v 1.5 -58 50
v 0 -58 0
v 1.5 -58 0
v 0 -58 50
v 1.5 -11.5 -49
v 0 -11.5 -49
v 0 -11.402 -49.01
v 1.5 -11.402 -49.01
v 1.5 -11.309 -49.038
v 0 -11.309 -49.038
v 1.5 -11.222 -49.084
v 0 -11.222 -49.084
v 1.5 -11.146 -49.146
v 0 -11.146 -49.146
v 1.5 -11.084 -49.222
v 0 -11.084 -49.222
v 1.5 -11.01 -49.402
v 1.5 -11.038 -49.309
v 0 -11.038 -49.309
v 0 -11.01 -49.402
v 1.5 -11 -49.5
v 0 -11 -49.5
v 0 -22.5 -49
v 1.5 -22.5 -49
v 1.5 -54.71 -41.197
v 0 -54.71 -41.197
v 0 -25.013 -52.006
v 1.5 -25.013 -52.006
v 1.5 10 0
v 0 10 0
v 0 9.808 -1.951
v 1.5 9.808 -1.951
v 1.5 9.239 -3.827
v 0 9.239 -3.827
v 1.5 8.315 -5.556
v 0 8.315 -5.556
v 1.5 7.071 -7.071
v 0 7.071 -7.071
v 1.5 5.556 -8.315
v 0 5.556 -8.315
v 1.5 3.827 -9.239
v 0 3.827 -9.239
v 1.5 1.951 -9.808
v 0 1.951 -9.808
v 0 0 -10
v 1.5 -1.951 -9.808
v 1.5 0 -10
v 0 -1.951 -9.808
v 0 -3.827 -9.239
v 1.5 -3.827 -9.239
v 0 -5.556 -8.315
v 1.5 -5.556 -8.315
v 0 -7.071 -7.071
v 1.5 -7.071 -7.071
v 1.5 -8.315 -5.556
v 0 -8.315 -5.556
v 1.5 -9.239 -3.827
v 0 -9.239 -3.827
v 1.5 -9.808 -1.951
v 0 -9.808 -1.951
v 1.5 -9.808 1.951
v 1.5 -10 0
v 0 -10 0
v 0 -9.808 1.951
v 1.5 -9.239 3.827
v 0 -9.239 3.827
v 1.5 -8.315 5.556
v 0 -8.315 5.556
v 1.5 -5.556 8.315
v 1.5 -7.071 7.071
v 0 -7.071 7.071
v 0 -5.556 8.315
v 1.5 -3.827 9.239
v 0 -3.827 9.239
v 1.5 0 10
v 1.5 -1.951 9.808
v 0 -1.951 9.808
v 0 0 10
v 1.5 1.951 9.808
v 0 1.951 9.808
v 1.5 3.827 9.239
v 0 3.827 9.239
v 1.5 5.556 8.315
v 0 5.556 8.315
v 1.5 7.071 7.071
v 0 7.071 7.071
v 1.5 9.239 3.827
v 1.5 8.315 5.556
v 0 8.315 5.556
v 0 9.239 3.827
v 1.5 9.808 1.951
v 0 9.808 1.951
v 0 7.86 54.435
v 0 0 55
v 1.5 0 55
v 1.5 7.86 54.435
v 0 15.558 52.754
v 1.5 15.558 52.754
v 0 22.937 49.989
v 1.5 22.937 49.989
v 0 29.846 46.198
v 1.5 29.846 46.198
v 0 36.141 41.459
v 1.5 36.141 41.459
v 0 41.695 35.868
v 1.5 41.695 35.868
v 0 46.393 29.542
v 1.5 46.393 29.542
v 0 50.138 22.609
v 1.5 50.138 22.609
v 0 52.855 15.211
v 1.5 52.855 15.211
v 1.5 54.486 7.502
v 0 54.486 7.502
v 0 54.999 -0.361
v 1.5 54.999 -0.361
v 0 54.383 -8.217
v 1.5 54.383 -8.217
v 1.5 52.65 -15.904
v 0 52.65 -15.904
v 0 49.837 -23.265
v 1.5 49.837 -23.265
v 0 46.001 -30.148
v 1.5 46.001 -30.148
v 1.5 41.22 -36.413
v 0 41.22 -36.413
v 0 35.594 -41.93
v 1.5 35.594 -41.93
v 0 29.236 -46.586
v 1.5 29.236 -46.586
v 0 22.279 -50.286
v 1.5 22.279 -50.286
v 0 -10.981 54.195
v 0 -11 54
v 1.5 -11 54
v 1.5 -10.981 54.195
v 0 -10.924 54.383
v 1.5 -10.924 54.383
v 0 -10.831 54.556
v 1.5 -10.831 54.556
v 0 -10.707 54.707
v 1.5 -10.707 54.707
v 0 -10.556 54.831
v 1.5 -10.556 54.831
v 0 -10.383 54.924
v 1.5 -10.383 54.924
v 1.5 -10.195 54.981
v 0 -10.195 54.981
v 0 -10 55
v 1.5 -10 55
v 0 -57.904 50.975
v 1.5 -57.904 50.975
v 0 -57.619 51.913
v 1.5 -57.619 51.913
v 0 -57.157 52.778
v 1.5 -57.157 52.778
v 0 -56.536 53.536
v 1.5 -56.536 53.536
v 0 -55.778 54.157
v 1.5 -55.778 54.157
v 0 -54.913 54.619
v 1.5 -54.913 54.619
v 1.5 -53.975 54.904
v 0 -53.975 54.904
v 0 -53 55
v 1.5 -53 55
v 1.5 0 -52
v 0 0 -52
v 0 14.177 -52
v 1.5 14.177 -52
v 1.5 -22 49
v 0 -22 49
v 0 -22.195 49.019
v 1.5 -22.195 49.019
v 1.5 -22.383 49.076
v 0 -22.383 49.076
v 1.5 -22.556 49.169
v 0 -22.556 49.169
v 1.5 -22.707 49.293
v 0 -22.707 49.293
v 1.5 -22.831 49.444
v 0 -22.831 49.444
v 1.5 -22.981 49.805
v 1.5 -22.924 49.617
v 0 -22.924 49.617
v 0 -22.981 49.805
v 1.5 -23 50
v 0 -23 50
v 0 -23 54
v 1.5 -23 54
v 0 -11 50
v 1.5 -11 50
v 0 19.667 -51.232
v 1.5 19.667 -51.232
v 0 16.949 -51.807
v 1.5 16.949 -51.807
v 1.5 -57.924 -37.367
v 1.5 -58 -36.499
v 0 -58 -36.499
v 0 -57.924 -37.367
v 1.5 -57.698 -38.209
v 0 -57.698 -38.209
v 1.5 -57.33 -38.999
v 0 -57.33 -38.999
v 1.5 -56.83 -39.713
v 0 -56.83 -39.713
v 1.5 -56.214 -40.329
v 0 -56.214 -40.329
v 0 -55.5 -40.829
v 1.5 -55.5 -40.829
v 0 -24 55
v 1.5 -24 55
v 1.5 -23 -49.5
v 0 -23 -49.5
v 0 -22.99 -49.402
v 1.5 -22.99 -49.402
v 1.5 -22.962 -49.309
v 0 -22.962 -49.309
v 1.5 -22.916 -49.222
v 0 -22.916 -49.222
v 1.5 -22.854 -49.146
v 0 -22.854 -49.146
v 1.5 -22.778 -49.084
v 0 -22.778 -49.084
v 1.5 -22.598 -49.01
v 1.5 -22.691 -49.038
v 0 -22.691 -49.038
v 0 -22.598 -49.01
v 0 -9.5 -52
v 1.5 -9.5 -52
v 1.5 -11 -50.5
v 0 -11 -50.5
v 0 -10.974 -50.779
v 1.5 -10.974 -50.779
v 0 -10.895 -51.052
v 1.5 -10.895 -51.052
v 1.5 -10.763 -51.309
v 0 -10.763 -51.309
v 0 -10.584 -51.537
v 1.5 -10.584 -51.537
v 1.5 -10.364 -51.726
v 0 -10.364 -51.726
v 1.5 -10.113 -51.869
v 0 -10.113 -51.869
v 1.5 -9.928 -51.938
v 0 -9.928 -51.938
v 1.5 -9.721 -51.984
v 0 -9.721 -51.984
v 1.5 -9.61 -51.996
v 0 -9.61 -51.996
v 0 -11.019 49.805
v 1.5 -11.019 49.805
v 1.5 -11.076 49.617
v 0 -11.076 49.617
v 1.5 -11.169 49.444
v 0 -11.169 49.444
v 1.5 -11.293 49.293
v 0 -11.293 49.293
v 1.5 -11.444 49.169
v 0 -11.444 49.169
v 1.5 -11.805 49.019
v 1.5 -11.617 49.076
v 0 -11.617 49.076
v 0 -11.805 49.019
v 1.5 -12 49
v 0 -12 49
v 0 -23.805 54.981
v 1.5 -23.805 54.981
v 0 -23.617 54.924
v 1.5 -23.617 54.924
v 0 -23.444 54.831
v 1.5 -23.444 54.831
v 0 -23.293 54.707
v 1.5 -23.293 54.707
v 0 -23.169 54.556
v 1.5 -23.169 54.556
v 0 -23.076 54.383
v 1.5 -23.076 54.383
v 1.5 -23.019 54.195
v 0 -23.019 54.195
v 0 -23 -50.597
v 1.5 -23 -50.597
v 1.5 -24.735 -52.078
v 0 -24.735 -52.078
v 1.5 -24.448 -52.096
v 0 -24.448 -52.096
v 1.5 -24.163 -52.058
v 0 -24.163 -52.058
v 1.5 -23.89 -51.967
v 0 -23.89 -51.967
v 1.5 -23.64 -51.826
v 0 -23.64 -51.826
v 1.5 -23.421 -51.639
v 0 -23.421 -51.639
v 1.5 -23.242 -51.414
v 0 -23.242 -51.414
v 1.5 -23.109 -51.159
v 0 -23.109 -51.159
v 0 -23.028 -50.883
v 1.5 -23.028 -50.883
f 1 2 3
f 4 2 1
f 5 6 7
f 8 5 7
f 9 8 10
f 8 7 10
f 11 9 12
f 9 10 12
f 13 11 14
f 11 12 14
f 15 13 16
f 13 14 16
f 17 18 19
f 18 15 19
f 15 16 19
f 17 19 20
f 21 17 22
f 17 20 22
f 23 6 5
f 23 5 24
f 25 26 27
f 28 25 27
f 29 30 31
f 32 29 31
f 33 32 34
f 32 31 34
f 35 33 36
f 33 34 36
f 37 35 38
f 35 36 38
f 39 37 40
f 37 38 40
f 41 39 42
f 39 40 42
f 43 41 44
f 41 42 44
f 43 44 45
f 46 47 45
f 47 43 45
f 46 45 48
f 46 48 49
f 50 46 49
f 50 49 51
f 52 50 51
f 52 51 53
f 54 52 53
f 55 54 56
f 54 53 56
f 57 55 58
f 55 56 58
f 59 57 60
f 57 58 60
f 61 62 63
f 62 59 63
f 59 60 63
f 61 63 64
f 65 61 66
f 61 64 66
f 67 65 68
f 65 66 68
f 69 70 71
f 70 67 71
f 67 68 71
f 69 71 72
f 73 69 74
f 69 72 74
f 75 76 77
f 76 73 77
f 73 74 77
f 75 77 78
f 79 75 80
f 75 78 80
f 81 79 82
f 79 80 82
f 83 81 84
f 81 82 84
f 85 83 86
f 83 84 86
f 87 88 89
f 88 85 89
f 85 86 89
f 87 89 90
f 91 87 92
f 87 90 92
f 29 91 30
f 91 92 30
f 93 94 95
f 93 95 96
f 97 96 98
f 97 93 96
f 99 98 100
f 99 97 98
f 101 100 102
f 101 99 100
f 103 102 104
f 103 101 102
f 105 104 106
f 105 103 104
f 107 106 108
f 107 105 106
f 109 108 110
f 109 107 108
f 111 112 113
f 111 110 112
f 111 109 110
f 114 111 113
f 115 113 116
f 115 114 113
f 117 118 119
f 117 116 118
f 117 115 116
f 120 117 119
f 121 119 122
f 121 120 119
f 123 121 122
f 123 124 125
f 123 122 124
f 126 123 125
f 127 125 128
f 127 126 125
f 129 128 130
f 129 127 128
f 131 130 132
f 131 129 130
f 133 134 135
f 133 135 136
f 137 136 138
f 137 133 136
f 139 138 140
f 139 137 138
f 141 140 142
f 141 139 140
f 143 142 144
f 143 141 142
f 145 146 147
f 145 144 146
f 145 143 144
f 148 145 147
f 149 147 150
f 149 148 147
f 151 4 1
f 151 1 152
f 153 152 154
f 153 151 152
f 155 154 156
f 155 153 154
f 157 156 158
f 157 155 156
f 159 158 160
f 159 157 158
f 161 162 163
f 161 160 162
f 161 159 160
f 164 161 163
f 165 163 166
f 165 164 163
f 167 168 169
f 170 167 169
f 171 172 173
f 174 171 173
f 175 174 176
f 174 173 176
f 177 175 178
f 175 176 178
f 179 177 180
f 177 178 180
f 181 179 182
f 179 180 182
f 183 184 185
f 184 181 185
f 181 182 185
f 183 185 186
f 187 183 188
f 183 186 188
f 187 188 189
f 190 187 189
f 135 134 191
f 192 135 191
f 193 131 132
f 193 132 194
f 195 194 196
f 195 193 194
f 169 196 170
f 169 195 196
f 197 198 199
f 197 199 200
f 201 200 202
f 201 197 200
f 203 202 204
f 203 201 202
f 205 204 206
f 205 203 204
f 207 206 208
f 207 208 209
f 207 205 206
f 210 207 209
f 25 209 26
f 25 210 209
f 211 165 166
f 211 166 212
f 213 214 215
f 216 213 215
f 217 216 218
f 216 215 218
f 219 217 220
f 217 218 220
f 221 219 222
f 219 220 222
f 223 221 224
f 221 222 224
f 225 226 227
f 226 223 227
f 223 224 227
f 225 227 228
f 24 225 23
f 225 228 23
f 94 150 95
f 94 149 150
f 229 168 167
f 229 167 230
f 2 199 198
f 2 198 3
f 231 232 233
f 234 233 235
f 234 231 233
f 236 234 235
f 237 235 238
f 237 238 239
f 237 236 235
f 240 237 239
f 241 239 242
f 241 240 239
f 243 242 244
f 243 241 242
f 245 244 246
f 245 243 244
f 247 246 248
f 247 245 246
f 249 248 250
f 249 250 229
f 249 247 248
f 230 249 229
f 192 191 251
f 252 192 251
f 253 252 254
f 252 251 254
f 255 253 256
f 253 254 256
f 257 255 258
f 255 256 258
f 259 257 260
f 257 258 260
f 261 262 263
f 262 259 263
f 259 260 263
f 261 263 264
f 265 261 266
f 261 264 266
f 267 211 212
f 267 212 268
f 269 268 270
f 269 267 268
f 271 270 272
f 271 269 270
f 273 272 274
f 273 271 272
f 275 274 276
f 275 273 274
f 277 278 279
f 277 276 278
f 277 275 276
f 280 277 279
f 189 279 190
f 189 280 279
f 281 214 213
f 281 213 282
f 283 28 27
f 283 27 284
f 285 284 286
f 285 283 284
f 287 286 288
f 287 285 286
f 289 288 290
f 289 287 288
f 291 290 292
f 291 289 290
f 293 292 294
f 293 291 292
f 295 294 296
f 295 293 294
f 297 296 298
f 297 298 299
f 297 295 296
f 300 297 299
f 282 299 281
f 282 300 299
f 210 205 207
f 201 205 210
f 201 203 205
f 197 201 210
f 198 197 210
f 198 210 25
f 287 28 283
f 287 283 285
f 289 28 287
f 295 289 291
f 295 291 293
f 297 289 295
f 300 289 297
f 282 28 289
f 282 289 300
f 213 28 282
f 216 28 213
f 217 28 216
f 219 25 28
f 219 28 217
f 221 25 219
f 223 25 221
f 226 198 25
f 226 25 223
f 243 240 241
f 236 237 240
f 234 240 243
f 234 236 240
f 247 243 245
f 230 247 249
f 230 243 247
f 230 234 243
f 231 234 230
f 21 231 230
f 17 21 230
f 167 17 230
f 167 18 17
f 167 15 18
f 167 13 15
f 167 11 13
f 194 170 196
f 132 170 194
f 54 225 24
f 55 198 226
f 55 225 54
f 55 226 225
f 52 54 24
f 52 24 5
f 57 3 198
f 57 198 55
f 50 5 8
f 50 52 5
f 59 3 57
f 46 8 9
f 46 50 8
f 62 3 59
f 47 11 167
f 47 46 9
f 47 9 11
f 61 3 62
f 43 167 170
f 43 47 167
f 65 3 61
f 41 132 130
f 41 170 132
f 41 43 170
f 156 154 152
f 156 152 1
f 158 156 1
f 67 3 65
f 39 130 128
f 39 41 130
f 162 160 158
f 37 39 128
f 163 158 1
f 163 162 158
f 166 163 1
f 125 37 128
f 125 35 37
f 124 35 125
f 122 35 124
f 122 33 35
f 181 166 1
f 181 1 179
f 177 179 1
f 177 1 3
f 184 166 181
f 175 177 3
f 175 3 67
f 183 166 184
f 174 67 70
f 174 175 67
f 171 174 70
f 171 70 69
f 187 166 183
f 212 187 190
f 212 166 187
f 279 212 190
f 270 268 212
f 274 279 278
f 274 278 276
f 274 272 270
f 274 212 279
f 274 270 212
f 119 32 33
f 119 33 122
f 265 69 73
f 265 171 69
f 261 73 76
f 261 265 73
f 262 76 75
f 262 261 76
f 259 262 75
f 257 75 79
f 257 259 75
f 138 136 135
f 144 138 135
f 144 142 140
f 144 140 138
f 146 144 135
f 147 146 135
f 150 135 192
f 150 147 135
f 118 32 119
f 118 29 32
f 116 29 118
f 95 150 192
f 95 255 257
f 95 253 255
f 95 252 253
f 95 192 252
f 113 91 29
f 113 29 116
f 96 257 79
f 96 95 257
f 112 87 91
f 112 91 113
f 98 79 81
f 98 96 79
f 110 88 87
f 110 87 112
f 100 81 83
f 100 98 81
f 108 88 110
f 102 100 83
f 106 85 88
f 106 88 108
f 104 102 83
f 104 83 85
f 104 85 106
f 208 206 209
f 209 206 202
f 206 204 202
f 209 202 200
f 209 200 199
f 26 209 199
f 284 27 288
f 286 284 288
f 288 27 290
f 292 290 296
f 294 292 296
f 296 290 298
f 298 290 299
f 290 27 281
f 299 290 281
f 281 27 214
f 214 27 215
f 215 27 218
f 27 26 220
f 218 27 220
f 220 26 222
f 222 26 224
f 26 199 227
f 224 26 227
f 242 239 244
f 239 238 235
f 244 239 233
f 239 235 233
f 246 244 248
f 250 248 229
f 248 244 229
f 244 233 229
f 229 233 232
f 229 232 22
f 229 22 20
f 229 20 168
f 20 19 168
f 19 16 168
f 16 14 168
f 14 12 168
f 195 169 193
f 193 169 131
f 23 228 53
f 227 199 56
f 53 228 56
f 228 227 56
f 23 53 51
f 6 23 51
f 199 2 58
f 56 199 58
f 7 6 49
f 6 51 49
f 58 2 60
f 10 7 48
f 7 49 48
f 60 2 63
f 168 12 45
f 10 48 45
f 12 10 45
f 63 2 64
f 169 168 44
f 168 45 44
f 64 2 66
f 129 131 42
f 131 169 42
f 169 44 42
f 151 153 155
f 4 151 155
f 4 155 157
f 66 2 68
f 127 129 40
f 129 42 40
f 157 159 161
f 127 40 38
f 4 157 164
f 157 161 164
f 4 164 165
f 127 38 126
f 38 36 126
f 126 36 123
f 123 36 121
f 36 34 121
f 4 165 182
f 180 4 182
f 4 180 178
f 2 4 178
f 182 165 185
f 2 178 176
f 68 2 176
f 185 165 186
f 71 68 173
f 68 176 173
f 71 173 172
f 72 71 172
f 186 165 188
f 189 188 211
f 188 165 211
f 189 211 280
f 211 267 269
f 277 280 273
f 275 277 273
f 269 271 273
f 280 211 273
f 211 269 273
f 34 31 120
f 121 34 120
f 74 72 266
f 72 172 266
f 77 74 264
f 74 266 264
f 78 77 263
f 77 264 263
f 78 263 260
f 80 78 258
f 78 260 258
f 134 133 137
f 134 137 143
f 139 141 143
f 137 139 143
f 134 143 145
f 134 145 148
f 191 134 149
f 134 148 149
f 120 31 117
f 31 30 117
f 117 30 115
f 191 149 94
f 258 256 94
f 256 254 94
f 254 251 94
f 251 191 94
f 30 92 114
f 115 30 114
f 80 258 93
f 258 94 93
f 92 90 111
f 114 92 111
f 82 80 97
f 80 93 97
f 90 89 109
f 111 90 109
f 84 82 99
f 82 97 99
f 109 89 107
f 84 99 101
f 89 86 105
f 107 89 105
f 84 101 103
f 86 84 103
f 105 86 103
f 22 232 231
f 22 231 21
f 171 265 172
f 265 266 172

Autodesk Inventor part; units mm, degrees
ref_plane "YZ Plane" through (0, 0, 0) normal (1, 0, 0) x (0, 1, 0)
ref_plane "XZ Plane" through (0, 0, 0) normal (0, 1, 0) x (-1, 0, 0)
ref_plane "XY Plane" through (0, 0, 0) normal (0, 0, 1) x (1, 0, 0)
sketch "Sketch1" plane through (0, 0, 0) normal (1, 0, 0) x (0, 1, 0)
  line L0 (-58, -40) -> (-58, 50)
  line L1 (0, 0) -> (-57.3223, 54.5531) construction
  circle A0 centre (0, 0) radius 47 construction
  circle A1 centre (0, 0) radius 10
  line L2 (-11, -52) -> (14.1774, -52)
  line L3 (-58, 0) -> (-58, -40)
  line L4 (0, 0) -> (0, -52) construction
  line L5 (-58, -40) -> (-23, -52.739)
  circle A2 centre (0, 0) radius 50 construction
  arc A3 (22.2788, -50.2857) -> (0, 55) centre (0, 0) ccw
  line L6 (-43.4633, 41.3636) -> (-48.6337, 35.9307)
  arc A4 (-53, 55) -> (-58, 50) centre (-53, 50) ccw
  line L7 (-11, 54) -> (-11, 50)
  line L8 (-12, 49) -> (-22, 49)
  line L9 (-23, 50) -> (-23, 54)
  line L10 (-53, 55) -> (-24, 55)
  line L11 (-10, 55) -> (0, 55)
  arc A5 (-23, 54) -> (-24, 55) centre (-24, 54) ccw
  arc A6 (-10, 55) -> (-11, 54) centre (-10, 54) ccw
  arc A7 (-12, 49) -> (-11, 50) centre (-12, 50) ccw
  arc A8 (-23, 50) -> (-22, 49) centre (-22, 50) ccw
  arc A9 (14.1774, -52) -> (22.2788, -50.2857) centre (14.1774, -32) ccw
  line L12 (-23, -49.5) -> (-23, -52.739)
  line L13 (-11, -52) -> (-11, -49.5)
  line L14 (-11.5, -49) -> (-22.5, -49)
  arc A10 (-11, -49.5) -> (-11.5, -49) centre (-11.5, -49.5) ccw
  arc A11 (-22.5, -49) -> (-23, -49.5) centre (-22.5, -49.5) ccw
  line L15 (0, -52) -> (-10, -52)
  point P0 (-28.9755, 27.5757)
  point P1 (-57.7919, 55)
  point P2 (-58, 55)
  point P3 (-25.2108, 39.6663)
  point P4 (17.9165, -52)
  point P5 (-23, 55)
  point P6 (-11, 52)
  dimension "d4" = 94
  dimension "d8" = 60
  dimension "d9" = 20
  dimension "d13" = 52
  dimension "d20" = 100
  dimension "d31" = 55
  dimension "d34" = 58
  dimension "d52" = 5
  dimension "d54" = 47
  dimension "d56" = 1
  dimension "d59" = 20
  dimension "d60" = 12
  dimension "d61" = 6
  dimension "d65" = 0.5
  dimension "d71" = 95
  dimension "d74" = 110
  dimension "d75" = 12
  dimension "d76" = 3
extrude "Extrusion4" add sketch "Sketch1" along normal blind 1.5
fillet "Fillet1" radius 5 1 edges at (0.75, -58, -40)
fillet "Fillet2" radius 1.5 2 edges at (0.75, -23, -52.739) (0.75, -11, -52)
properties part number "OuterFlange27130914"
